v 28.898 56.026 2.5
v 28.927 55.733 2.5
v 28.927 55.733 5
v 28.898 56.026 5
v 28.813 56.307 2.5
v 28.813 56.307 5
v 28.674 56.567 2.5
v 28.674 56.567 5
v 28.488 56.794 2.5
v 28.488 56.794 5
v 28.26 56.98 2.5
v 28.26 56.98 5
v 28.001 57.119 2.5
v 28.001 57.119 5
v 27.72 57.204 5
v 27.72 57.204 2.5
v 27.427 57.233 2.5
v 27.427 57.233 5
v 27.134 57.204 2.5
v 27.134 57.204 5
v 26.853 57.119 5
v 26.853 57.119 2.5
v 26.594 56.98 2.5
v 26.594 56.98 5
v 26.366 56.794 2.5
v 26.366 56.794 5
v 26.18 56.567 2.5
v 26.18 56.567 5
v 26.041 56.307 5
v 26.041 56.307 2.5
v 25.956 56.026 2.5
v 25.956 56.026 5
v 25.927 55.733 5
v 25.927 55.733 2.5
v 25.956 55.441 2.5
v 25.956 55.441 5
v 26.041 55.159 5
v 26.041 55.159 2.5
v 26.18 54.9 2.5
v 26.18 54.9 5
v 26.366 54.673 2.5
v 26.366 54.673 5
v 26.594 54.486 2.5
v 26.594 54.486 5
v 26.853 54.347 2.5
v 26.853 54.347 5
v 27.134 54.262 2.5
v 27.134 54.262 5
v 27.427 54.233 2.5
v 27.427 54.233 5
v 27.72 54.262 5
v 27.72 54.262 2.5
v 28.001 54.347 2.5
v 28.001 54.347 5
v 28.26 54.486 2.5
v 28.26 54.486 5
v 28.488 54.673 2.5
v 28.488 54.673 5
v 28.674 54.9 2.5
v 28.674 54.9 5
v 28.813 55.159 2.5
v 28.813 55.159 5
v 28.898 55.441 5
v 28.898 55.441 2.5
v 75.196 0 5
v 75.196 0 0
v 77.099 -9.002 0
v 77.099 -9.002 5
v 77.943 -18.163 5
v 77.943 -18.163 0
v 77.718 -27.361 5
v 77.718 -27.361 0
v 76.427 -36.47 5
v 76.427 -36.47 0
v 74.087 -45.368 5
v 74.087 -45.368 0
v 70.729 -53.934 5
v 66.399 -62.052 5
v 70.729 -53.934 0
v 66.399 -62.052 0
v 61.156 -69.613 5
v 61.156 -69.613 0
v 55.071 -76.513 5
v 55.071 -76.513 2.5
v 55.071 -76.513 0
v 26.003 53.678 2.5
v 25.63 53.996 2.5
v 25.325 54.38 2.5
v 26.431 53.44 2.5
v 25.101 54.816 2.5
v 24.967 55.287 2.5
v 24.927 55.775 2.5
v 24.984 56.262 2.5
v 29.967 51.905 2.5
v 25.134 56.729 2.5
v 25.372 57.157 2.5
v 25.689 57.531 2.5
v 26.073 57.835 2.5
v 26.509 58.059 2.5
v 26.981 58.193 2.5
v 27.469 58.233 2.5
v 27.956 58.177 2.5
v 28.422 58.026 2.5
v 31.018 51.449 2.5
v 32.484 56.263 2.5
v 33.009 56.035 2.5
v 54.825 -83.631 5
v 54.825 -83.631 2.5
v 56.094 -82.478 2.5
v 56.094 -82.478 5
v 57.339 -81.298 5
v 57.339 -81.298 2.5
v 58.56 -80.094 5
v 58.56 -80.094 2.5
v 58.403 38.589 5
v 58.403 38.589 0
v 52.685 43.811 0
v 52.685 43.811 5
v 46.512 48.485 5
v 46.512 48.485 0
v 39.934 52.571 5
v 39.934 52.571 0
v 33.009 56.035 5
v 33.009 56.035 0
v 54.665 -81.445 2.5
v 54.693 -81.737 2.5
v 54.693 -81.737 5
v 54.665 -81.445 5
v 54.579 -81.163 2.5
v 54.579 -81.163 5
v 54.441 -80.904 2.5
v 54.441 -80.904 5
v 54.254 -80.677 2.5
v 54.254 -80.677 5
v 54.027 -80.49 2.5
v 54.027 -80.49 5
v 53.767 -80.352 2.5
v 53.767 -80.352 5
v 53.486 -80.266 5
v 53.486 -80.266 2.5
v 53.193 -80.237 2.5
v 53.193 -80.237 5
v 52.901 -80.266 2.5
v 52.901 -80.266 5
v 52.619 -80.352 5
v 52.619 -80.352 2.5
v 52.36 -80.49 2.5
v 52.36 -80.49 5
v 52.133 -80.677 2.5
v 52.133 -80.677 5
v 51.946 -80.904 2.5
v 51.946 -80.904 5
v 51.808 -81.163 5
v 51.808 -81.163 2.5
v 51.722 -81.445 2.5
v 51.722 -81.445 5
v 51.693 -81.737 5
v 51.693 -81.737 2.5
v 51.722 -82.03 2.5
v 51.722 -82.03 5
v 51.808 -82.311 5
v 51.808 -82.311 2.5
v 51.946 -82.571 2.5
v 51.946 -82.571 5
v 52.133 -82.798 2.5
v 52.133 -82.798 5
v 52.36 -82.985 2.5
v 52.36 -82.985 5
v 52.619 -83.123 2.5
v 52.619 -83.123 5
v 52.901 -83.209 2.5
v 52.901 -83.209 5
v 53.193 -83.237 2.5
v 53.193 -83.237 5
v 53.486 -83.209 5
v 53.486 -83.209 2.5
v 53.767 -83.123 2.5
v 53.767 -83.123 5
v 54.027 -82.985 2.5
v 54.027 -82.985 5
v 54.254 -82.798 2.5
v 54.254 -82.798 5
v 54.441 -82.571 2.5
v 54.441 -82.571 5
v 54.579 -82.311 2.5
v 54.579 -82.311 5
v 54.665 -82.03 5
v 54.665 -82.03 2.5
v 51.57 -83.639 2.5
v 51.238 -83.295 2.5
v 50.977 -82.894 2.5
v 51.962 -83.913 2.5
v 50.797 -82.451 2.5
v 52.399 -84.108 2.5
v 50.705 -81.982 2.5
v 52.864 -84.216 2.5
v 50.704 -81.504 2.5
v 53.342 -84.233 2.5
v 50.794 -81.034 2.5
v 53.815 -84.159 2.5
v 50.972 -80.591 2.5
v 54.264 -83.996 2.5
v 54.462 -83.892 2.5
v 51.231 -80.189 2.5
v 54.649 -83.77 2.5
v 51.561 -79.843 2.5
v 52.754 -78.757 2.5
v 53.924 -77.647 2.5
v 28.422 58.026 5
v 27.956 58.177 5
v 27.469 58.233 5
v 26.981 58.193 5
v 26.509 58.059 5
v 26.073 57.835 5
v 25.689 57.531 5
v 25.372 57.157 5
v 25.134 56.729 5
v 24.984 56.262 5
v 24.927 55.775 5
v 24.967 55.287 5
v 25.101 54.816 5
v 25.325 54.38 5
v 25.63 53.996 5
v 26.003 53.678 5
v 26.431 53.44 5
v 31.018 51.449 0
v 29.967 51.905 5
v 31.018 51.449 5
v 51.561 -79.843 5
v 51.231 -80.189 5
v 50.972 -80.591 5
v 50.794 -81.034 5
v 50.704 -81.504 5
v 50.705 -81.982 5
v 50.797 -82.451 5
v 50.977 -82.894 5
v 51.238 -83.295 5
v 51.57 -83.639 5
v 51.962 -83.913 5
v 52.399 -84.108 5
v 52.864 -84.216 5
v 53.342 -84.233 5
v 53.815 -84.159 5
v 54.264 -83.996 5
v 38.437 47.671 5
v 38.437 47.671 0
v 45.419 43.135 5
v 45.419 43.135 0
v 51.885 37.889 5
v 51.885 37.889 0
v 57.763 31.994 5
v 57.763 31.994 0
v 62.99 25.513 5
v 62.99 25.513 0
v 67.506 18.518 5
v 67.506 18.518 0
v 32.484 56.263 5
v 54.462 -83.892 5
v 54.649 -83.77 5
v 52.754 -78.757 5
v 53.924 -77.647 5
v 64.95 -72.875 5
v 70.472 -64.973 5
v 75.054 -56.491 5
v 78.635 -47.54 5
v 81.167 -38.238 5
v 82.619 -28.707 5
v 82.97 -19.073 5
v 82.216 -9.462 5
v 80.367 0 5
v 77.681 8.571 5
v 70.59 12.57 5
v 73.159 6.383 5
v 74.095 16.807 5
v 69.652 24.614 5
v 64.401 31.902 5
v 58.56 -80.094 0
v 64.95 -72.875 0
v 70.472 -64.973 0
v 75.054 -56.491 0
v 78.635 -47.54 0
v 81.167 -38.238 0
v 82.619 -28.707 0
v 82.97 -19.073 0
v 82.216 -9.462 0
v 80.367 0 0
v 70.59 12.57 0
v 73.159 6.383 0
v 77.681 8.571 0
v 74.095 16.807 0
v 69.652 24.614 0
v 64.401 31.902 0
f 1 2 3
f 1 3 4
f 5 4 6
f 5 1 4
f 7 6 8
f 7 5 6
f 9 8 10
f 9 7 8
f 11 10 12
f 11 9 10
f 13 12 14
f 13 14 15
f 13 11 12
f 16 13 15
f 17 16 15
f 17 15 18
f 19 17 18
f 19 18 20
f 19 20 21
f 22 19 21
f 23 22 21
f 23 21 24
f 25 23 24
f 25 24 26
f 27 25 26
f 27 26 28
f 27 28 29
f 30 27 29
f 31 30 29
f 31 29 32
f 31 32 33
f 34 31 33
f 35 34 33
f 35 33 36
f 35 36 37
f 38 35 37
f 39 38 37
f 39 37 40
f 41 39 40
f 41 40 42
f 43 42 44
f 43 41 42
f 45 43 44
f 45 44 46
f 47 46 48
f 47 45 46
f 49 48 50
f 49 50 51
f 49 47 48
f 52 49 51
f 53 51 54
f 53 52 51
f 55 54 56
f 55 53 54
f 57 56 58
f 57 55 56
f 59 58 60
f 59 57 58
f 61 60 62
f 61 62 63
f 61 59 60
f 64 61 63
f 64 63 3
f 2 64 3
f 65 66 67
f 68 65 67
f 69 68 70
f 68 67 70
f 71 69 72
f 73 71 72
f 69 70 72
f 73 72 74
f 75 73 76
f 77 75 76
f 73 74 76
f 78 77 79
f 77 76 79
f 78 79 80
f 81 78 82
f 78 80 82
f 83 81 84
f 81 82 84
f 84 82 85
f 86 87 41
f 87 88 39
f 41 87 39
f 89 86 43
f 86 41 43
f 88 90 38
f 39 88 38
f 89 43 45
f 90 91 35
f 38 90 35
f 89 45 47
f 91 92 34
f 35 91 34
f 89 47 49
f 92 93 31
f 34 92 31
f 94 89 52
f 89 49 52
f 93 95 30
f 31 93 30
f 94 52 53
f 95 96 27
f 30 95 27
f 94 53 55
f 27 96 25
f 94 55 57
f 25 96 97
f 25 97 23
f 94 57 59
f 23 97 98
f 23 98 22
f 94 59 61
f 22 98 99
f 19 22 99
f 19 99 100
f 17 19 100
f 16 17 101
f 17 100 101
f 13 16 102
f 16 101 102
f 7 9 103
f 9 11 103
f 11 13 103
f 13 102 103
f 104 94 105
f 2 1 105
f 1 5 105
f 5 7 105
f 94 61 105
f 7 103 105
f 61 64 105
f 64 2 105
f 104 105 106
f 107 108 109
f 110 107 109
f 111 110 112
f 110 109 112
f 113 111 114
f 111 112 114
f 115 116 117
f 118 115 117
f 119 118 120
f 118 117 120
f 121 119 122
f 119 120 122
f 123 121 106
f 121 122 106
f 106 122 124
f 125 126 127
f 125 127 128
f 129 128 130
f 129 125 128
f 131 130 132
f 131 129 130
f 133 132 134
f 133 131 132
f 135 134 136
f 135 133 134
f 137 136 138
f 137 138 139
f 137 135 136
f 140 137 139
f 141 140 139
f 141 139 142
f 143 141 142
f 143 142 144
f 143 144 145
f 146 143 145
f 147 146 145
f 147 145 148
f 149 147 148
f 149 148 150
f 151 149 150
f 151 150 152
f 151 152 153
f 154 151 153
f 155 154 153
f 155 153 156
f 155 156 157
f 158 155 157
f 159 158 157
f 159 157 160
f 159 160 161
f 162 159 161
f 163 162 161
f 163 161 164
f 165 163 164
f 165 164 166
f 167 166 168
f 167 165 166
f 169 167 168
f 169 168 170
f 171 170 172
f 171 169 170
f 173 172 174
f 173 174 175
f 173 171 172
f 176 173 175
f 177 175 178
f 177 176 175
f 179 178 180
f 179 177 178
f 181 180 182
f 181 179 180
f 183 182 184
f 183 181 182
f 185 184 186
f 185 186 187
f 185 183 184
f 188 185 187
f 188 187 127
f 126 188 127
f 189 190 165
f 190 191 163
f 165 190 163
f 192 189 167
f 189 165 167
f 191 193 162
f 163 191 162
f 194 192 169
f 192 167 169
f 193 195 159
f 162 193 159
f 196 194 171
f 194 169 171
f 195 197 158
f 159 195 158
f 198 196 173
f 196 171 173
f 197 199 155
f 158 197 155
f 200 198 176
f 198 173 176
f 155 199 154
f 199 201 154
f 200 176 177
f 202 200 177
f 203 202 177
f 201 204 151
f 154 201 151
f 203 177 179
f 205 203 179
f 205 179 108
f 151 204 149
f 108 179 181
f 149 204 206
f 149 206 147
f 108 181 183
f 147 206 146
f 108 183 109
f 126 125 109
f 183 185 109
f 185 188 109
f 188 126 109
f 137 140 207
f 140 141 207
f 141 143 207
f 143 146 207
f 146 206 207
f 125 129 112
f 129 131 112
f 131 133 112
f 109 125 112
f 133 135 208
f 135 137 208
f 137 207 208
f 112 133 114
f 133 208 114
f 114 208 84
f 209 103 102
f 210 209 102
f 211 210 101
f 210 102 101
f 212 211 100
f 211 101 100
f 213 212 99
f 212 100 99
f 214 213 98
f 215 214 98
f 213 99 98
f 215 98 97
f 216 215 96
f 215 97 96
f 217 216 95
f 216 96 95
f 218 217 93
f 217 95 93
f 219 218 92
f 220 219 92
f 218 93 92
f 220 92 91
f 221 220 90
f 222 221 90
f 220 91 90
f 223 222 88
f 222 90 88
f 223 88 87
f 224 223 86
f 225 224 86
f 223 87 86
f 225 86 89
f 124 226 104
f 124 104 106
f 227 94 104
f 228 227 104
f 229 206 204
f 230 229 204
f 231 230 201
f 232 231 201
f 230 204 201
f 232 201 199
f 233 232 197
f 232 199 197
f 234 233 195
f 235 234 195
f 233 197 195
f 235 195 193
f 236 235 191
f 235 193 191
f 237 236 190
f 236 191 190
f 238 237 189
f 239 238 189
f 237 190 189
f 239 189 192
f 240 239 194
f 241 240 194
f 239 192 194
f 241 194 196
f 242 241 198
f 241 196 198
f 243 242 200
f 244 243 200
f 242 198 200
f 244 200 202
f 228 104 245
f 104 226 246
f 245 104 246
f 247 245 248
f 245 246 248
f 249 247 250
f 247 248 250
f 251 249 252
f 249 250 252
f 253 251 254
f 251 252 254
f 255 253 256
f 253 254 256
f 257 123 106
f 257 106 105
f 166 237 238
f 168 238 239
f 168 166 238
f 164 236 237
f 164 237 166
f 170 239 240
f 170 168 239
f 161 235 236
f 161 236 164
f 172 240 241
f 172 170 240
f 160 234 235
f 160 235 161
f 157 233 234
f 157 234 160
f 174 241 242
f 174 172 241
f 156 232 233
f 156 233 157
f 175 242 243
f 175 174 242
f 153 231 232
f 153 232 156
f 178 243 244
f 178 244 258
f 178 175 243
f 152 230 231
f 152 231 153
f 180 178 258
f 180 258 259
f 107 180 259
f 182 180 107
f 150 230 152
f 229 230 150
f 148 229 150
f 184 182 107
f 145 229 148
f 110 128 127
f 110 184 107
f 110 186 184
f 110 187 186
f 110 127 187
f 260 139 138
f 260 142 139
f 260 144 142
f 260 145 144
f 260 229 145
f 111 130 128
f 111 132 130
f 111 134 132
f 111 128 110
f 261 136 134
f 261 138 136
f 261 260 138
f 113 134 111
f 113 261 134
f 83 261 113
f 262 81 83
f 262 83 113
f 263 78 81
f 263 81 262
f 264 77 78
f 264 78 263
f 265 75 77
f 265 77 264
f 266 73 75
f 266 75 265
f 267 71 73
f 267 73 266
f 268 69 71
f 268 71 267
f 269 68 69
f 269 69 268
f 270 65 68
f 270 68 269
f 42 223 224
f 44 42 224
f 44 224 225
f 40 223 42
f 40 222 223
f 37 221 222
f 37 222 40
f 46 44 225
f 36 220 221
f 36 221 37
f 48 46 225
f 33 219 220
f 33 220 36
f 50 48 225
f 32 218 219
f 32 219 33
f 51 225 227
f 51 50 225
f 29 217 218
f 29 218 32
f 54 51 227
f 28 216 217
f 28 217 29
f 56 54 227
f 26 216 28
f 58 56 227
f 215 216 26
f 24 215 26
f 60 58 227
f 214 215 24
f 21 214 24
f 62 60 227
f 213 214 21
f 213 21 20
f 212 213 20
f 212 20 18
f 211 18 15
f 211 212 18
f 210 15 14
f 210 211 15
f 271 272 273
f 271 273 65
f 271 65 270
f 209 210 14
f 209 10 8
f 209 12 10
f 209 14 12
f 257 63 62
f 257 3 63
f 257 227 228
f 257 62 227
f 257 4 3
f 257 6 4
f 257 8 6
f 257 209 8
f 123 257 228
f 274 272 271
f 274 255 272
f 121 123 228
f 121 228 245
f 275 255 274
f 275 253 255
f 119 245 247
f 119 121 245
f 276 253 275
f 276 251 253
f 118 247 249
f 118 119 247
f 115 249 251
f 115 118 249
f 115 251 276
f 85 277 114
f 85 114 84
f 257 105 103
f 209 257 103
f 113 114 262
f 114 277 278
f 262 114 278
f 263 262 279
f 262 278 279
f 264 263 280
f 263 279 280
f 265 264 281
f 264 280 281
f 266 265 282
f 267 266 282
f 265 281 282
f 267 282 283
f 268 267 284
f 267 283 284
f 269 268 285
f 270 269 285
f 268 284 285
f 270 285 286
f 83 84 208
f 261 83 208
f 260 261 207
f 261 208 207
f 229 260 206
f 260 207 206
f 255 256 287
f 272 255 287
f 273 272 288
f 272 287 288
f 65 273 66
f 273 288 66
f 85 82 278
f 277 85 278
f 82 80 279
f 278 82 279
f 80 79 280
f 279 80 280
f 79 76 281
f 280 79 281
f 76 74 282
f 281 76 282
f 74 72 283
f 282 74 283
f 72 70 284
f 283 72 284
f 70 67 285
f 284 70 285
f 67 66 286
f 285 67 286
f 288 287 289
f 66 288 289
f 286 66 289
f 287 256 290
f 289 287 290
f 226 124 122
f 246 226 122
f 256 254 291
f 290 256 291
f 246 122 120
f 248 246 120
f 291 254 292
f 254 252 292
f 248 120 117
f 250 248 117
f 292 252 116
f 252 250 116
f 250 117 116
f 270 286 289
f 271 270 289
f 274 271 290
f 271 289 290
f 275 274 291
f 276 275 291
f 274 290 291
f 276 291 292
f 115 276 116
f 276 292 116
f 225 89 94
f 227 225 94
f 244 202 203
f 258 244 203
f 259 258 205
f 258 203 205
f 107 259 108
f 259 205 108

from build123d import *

# Parameters (mm, degrees)
F0_R     = 1.5
F1_DEPTH = 5
F2_DEPTH = 2.5
F4_DEPTH = 2.5


# Not quite as in the source:
# - a feature names something its author has since deleted; it is built from what else it names


with BuildPart() as f1:
    # F0 (on Top) → F1 (new body)
    with BuildSketch(Plane.XY):
        with BuildLine():
            Line((30, 51.9615242271), (32.4836596815, 56.2633489842))
            Line((32.4836596815, 56.2633489842), (28.4224519805, 58.0264243292))
            ThreePointArc((28.4224519805, 58.0264243292), (25.1336779708, 56.7287473614), (26.4313549386, 53.4399733516))
            Line((26.4313549386, 53.4399733516), (29.967319363, 51.9049197034))
            Line((29.967319363, 51.9049197034), (30, 51.9615242271))
        make_face()
        with Locations((27.4269034596, 55.7331988404)):
            Circle(F0_R, mode=Mode.SUBTRACT)
        with BuildLine():
            ThreePointArc((67.5061883913, 18.5179515304), (63.7494272333, 28.9138466382), (58.4029909795, 38.5887372772))
            ThreePointArc((58.4029909795, 38.5887372772), (46.511709986, 48.4848469682), (33.0089029581, 56.0353272873))
            Line((33.0089029581, 56.0353272873), (31.0178059162, 51.4488763097))
            ThreePointArc((31.0178059162, 51.4488763097), (51.8847287198, 37.8894735935), (67.5061883913, 18.5179515304))
        make_face()
        Polygon((31.0178059162, 51.4488763097), (33.0089029581, 56.0353272873), (32.4836596815, 56.2633489842), (30, 51.9615242271), (29.967319363, 51.9049197034), align=None)
        with BuildLine():
            ThreePointArc((54.2641944404, -83.9964118384), (54.5449950566, -83.8143395504), (54.8251847727, -83.6313285476))
            ThreePointArc((54.8251847727, -83.6313285476), (56.7197095597, -81.8911804241), (58.5601267726, -80.0939035554))
            Line((58.5601267726, -80.0939035554), (55.0705599201, -76.5129397591))
            ThreePointArc((55.0705599201, -76.5129397591), (53.341493873, -78.2050105238), (51.5614910891, -79.8434130866))
            ThreePointArc((51.5614910891, -79.8434130866), (51.0979794421, -83.1009956935), (54.2641944404, -83.9964118384))
        make_face()
        with Locations((53.1933379309, -81.7373708171)):
            Circle(F0_R, mode=Mode.SUBTRACT)
        with BuildLine():
            Line((55.0705599201, -76.5129397591), (58.5601267726, -80.0939035554))
            ThreePointArc((58.5601267726, -80.0939035554), (80.0342840094, -42.9250014233), (80.3674019431, 0))
            Line((80.3674019431, 0), (75.1959644791, 0))
            ThreePointArc((75.1959644791, 0), (75.3863719236, -40.9533729371), (55.0705599201, -76.5129397591))
        make_face()
        with BuildLine():
            ThreePointArc((54.2641944404, -83.9964118384), (54.5569628073, -83.8327293059), (54.8251847727, -83.6313285476))
            ThreePointArc((54.8251847727, -83.6313285476), (54.5449950566, -83.8143395504), (54.2641944404, -83.9964118384))
        make_face()
        with BuildLine():
            Line((75.1959644791, 0), (80.3674019431, 0))
            ThreePointArc((80.3674019431, 0), (71.977896021, 20.7701131861), (58.4029909795, 38.5887372772))
            ThreePointArc((58.4029909795, 38.5887372772), (63.7494272333, 28.9138466382), (67.5061883913, 18.5179515304))
            ThreePointArc((67.5061883913, 18.5179515304), (71.9402181457, 9.5036231189), (75.1959644791, 0))
        make_face()
    extrude(amount=F1_DEPTH)


with BuildPart() as f2:
    # F0 (on Top) → F2 (new body)
    with BuildSketch(Plane.XY):
        Polygon((31.0178059162, 51.4488763097), (33.0089029581, 56.0353272873), (32.4836596815, 56.2633489842), (30, 51.9615242271), (29.967319363, 51.9049197034), align=None)
        with BuildLine():
            Line((30, 51.9615242271), (32.4836596815, 56.2633489842))
            Line((32.4836596815, 56.2633489842), (28.4224519805, 58.0264243292))
            ThreePointArc((28.4224519805, 58.0264243292), (25.1336779708, 56.7287473614), (26.4313549386, 53.4399733516))
            Line((26.4313549386, 53.4399733516), (29.967319363, 51.9049197034))
            Line((29.967319363, 51.9049197034), (30, 51.9615242271))
        make_face()
        with Locations((27.4269034596, 55.7331988404)):
            Circle(F0_R, mode=Mode.SUBTRACT)
    extrude(amount=F2_DEPTH)


with BuildPart() as f1_1:
    add(f1.part)

    # F3: cut F2
    add(f2.part, mode=Mode.SUBTRACT)


with BuildPart() as f4:
    # F0 (on Top) → F4 (new body)
    with BuildSketch(Plane.XY):
        with BuildLine():
            ThreePointArc((54.2641944404, -83.9964118384), (54.5449950566, -83.8143395504), (54.8251847727, -83.6313285476))
            ThreePointArc((54.8251847727, -83.6313285476), (56.7197095597, -81.8911804241), (58.5601267726, -80.0939035554))
            Line((58.5601267726, -80.0939035554), (55.0705599201, -76.5129397591))
            ThreePointArc((55.0705599201, -76.5129397591), (53.341493873, -78.2050105238), (51.5614910891, -79.8434130866))
            ThreePointArc((51.5614910891, -79.8434130866), (51.0979794421, -83.1009956935), (54.2641944404, -83.9964118384))
        make_face()
        with Locations((53.1933379309, -81.7373708171)):
            Circle(F0_R, mode=Mode.SUBTRACT)
        with BuildLine():
            ThreePointArc((54.2641944404, -83.9964118384), (54.5569628073, -83.8327293059), (54.8251847727, -83.6313285476))
            ThreePointArc((54.8251847727, -83.6313285476), (54.5449950566, -83.8143395504), (54.2641944404, -83.9964118384))
        make_face()
    extrude(amount=F4_DEPTH)


with BuildPart() as f1_2:
    add(f1_1.part)

    # F5: cut F4
    add(f4.part, mode=Mode.SUBTRACT)


solid = f1_2.part
